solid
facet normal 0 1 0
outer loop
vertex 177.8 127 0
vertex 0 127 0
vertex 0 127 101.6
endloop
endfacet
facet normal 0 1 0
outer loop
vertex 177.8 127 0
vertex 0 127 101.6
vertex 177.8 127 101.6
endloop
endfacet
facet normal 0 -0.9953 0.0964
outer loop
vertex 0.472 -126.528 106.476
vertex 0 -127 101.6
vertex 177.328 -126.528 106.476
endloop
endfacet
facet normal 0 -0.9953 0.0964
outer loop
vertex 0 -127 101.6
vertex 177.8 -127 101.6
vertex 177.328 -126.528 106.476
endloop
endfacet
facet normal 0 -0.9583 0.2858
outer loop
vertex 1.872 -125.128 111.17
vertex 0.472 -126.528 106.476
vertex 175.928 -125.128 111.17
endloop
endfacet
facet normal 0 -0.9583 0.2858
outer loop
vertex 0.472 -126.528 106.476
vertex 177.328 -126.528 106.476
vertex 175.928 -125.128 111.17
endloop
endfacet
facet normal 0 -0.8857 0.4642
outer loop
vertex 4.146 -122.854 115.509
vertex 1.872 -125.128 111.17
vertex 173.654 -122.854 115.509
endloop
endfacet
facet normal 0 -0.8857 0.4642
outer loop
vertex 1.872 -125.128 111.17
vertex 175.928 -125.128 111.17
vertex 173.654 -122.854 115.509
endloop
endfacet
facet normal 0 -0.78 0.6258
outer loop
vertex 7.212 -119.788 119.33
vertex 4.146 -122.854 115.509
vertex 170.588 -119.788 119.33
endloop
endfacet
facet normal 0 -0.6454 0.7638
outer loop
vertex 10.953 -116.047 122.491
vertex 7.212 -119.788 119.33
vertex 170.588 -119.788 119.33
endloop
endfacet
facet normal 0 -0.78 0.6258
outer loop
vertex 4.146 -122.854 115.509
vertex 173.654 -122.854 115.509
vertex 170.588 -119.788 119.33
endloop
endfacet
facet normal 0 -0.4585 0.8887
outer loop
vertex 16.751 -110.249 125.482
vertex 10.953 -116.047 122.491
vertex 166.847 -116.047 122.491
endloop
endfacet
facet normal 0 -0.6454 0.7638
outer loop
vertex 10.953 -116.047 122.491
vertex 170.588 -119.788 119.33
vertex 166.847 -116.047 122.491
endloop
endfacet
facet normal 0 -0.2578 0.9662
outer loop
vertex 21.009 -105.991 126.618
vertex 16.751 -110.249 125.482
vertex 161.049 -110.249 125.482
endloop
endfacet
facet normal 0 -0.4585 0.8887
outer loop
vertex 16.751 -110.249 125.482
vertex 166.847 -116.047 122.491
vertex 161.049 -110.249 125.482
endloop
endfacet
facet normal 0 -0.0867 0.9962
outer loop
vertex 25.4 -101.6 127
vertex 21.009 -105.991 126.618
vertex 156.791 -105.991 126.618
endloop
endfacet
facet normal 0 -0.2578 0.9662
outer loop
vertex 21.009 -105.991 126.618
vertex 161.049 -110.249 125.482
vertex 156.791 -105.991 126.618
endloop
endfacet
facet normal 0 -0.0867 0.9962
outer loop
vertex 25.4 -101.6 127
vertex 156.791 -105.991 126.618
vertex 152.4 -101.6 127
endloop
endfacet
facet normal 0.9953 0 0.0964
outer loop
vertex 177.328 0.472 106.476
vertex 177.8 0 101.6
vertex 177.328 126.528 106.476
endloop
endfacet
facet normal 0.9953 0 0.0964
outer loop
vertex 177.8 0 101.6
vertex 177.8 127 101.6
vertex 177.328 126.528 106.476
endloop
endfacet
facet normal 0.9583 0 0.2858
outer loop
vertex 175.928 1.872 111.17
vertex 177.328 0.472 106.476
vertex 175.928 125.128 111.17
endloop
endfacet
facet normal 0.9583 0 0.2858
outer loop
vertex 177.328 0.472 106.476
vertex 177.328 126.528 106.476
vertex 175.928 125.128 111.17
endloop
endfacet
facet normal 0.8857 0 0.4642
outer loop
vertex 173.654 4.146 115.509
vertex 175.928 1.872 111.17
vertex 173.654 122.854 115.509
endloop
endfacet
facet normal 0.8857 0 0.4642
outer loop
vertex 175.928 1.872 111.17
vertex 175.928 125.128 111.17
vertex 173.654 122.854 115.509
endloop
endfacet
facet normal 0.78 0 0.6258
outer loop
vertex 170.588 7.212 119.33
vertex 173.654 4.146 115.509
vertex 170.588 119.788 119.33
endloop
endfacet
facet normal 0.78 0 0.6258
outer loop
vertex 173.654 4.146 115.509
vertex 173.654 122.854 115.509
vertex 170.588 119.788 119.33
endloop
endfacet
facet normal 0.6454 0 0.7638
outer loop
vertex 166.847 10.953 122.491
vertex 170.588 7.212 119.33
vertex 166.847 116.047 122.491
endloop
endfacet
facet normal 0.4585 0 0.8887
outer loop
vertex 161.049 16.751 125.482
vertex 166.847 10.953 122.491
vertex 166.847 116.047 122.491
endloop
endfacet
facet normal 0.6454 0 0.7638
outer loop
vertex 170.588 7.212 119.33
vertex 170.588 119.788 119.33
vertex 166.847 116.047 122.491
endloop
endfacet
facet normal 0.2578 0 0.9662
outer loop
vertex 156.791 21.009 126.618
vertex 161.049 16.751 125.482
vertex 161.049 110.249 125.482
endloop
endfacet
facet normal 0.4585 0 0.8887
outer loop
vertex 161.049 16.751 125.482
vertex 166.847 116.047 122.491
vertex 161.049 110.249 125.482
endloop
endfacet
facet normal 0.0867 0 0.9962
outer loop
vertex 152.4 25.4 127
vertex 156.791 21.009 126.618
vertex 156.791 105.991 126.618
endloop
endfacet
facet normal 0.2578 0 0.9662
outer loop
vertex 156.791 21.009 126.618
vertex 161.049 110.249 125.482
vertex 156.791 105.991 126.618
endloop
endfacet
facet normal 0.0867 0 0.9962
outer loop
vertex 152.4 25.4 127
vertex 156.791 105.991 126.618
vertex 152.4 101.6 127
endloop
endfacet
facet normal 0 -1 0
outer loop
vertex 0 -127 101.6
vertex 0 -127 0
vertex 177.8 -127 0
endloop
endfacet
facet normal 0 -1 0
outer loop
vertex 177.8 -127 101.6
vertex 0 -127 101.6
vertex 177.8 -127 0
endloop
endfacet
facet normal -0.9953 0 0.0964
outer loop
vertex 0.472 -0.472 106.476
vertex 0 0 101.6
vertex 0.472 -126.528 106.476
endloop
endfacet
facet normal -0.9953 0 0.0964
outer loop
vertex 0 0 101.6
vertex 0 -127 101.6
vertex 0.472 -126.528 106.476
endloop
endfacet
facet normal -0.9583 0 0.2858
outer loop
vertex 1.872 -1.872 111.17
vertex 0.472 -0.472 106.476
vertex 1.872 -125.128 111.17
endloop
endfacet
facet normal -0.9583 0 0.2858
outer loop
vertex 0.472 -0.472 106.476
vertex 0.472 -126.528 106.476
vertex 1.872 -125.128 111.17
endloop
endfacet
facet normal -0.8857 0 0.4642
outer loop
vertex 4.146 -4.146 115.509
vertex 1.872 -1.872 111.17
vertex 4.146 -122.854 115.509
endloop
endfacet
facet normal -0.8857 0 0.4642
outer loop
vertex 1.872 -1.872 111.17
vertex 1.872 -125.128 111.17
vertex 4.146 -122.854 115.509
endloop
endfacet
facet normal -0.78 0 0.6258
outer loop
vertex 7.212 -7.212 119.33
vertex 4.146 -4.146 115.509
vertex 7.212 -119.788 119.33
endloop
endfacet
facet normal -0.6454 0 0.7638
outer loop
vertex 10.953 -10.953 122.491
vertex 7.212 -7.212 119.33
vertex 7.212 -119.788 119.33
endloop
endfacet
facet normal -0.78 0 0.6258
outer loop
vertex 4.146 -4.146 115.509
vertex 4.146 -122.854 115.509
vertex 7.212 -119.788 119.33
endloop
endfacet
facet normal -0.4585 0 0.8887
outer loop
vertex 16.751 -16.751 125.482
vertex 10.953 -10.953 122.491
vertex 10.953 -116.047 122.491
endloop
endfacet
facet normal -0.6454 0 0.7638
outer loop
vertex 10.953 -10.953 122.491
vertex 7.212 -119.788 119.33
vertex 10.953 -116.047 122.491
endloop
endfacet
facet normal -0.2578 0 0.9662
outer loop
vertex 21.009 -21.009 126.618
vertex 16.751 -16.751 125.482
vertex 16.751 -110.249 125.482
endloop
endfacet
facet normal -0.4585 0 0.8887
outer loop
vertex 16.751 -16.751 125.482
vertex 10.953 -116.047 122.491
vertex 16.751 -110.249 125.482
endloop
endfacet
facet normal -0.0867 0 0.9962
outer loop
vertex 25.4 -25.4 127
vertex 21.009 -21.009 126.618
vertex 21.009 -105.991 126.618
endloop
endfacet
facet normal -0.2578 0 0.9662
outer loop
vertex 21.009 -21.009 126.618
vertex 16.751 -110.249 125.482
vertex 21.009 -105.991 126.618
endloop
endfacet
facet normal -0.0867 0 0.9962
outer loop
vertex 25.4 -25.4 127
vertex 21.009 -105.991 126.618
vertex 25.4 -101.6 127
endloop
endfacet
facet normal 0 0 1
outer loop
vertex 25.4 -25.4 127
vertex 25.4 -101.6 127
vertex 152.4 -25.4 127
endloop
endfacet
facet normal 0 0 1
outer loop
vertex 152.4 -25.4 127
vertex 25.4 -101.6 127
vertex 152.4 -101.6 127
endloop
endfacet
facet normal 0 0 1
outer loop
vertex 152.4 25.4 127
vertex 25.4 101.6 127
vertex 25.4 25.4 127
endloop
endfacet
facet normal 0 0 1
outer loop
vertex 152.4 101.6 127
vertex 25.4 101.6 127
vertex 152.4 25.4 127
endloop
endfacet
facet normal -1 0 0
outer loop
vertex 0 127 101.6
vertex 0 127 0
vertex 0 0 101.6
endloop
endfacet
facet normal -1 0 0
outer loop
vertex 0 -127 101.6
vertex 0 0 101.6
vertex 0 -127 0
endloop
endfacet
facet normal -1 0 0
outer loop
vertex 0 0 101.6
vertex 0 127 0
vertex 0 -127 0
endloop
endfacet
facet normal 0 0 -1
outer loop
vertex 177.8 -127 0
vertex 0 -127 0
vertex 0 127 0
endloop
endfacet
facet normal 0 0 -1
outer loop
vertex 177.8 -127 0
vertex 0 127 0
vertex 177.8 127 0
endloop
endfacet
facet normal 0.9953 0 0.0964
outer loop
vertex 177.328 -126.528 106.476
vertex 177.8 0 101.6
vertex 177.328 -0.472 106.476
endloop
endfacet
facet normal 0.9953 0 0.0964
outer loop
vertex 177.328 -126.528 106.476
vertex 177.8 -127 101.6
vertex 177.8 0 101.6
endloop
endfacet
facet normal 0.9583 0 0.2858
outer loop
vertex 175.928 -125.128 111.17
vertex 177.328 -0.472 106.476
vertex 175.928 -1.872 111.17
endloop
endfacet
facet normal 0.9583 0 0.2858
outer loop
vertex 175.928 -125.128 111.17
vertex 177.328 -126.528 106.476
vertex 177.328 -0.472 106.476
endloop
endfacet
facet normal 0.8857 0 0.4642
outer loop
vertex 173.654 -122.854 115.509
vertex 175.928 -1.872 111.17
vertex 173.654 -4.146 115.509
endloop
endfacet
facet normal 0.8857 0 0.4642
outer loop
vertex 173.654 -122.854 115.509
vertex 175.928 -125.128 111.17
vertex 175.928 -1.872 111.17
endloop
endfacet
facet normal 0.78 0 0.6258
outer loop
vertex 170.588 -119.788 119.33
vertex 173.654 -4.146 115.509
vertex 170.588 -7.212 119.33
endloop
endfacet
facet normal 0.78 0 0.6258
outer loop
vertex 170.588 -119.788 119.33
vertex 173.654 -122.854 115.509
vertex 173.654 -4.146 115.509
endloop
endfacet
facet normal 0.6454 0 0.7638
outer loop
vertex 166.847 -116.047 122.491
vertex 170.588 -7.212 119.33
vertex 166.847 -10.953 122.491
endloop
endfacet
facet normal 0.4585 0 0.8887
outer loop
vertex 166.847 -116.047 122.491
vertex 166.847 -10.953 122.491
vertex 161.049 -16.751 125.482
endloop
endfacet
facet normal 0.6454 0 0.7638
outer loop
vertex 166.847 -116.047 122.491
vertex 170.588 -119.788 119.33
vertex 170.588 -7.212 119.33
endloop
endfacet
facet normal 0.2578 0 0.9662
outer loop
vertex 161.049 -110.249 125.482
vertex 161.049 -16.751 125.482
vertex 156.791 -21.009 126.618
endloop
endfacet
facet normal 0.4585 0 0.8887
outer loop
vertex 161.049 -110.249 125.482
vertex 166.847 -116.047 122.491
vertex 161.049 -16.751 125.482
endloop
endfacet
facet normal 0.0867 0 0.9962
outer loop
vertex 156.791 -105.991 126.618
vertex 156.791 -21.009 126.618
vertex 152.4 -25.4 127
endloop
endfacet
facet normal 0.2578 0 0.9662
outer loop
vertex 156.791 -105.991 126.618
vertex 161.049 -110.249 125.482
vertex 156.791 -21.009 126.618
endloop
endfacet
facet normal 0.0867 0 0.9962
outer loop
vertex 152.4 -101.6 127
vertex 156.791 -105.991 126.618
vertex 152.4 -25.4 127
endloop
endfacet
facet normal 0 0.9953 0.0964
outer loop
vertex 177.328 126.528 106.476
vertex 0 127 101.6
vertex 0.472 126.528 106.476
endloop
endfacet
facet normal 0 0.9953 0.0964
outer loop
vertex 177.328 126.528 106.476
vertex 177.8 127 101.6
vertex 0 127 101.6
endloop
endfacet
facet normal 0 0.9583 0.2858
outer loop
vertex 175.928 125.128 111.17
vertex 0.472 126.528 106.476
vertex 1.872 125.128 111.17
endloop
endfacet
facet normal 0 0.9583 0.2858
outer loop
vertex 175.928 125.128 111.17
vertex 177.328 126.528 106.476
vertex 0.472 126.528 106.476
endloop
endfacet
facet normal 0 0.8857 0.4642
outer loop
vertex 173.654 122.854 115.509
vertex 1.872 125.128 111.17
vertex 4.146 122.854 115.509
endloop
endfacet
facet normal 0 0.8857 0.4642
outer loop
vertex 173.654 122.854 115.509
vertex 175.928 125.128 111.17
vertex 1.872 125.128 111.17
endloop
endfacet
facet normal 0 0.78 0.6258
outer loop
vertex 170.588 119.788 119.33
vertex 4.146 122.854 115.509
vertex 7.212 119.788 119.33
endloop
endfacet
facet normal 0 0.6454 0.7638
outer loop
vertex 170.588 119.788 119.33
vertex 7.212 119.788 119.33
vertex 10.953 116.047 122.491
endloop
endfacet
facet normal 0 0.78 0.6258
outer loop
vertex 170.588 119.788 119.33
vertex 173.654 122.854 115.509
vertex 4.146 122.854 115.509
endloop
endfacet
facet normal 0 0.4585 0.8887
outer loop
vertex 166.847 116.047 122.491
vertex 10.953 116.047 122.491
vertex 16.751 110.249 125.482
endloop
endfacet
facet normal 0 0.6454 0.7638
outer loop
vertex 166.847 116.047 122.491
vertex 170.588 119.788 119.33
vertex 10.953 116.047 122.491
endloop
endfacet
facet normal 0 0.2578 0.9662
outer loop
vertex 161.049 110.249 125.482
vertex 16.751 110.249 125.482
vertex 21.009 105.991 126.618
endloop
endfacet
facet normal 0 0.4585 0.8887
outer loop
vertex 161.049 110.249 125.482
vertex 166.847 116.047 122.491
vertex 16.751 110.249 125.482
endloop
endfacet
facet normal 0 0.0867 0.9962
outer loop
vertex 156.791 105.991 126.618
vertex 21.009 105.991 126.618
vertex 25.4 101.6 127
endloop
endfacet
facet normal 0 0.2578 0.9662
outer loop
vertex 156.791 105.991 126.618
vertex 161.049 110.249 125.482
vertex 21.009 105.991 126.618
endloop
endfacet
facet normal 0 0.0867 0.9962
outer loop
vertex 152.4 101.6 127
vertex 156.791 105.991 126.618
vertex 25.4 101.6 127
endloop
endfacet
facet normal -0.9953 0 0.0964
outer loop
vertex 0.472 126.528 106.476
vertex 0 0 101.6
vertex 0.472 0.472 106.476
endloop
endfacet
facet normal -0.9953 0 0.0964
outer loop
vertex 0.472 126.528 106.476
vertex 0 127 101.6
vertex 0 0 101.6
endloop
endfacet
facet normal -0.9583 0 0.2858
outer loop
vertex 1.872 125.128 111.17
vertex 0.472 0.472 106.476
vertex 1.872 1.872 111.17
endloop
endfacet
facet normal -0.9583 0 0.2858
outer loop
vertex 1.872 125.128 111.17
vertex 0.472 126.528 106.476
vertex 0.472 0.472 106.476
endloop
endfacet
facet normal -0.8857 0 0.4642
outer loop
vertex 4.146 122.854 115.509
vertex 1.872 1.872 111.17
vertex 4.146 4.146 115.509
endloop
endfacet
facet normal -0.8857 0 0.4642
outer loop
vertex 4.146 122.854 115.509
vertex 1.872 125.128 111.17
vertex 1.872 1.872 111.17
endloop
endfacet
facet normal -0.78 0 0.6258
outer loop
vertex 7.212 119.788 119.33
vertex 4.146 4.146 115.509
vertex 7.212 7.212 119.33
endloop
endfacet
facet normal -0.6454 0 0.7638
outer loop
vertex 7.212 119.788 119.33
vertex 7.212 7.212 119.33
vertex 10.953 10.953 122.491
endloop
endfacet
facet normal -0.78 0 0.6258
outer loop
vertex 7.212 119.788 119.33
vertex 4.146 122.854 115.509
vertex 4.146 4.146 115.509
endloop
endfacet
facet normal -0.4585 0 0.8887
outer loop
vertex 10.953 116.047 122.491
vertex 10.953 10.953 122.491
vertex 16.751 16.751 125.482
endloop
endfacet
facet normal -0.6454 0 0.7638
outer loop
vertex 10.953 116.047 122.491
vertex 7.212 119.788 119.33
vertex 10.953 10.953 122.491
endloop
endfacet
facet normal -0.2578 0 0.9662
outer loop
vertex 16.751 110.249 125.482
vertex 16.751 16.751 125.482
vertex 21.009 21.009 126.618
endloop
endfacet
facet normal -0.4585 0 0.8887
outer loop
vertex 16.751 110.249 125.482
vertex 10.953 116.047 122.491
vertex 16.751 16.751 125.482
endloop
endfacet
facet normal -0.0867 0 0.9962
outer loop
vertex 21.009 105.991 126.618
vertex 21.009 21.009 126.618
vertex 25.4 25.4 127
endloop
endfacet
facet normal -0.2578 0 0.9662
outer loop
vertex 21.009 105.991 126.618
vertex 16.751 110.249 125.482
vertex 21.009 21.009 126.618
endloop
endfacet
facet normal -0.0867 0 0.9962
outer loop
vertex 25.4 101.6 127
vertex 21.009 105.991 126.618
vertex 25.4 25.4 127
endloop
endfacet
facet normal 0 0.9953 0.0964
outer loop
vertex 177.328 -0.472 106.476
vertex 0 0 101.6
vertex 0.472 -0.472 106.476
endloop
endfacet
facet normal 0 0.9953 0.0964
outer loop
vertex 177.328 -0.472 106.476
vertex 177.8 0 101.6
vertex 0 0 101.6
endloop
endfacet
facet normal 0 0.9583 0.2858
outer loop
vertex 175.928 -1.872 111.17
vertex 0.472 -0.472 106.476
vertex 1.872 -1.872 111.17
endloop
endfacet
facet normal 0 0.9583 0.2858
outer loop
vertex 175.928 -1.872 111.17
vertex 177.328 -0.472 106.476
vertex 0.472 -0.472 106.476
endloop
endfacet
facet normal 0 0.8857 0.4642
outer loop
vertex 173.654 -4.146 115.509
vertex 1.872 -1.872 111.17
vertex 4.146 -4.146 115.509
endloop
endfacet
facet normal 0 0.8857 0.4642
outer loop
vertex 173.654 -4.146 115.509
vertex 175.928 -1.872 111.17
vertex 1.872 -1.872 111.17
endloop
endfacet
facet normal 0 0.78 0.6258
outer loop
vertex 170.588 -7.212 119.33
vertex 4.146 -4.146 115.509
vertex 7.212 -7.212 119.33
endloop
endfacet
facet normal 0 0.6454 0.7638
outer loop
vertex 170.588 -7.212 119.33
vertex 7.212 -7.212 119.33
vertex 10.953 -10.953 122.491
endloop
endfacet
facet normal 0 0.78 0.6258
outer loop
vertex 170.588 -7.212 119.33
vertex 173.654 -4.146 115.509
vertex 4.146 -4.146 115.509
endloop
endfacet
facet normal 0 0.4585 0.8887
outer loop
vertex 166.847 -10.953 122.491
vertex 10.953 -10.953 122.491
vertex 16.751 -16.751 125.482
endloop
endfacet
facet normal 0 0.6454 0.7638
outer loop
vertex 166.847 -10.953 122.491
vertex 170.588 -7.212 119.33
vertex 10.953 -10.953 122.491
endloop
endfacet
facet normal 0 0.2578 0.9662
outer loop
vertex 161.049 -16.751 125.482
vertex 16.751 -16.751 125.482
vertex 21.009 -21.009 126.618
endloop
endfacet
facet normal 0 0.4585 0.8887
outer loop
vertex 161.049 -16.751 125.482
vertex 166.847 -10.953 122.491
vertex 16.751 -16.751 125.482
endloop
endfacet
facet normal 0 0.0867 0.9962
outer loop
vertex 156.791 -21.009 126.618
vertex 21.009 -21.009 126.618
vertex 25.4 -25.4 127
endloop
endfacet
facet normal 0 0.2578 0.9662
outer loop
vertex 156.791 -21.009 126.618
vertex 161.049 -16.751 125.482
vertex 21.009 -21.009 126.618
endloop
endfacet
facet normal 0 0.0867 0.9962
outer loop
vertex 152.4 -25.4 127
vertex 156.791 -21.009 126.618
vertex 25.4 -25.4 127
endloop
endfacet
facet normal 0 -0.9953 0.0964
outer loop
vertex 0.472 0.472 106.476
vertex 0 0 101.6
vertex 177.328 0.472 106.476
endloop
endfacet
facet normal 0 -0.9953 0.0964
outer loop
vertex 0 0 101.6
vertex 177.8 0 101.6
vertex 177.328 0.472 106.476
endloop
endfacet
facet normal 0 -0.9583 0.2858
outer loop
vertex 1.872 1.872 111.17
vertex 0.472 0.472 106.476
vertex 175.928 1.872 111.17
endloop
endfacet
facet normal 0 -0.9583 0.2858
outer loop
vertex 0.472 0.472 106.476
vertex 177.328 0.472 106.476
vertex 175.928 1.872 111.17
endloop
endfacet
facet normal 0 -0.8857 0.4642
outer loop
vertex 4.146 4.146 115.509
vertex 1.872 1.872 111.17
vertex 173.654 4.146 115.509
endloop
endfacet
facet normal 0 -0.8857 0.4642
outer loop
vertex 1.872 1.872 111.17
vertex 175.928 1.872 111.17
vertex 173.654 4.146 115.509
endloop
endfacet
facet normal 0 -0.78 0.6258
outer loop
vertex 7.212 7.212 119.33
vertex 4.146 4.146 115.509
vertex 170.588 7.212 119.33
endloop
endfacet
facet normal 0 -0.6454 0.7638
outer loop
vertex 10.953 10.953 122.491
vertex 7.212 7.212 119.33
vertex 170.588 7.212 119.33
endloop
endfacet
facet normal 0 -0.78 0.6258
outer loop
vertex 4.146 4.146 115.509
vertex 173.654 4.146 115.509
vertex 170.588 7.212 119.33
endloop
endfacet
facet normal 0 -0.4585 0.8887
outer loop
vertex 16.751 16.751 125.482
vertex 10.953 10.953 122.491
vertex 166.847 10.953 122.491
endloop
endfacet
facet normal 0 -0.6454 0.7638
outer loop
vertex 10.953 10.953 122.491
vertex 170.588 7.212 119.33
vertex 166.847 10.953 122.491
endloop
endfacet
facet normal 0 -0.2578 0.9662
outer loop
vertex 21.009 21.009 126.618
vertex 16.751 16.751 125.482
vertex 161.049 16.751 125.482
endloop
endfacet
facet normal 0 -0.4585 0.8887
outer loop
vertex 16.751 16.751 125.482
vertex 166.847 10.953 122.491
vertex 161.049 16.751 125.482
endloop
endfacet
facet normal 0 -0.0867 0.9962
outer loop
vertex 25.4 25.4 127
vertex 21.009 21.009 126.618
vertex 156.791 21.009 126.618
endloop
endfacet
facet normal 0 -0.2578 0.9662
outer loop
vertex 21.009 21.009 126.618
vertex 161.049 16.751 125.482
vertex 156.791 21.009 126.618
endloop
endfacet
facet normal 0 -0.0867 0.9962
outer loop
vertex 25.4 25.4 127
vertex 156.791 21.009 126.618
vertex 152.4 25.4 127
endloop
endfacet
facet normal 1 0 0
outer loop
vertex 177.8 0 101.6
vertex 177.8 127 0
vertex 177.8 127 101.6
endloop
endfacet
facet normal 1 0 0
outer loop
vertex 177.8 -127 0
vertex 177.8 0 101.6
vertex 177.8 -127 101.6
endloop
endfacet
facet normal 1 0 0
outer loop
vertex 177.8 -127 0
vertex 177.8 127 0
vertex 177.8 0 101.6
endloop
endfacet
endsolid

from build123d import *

# Parameters (mm, degrees)
F0_W     = 177.8
F0_H     = 127
F1_DEPTH = 127
F2_R     = 25.4


with BuildPart() as f1:
    # F0 (on Top) → F1 (new body)
    with BuildSketch(Plane.XY):
        with Locations((88.9, 63.5)):
            Rectangle(F0_W, F0_H)
    extrude(amount=F1_DEPTH)

    # F2
    f2_edges = [f1.edges().sort_by_distance(p)[0] for p in [
        (0, 63.5, 127),
        (88.9, 0, 127),
        (88.9, 127, 127),
        (177.8, 63.5, 127),
    ]]
    fillet(f2_edges, radius=F2_R)

    # F3: F1 across plane


with BuildPart() as f1_1:
    add(f1.part)
    add(f1.part.mirror(Plane.XZ))


solid = f1_1.part
